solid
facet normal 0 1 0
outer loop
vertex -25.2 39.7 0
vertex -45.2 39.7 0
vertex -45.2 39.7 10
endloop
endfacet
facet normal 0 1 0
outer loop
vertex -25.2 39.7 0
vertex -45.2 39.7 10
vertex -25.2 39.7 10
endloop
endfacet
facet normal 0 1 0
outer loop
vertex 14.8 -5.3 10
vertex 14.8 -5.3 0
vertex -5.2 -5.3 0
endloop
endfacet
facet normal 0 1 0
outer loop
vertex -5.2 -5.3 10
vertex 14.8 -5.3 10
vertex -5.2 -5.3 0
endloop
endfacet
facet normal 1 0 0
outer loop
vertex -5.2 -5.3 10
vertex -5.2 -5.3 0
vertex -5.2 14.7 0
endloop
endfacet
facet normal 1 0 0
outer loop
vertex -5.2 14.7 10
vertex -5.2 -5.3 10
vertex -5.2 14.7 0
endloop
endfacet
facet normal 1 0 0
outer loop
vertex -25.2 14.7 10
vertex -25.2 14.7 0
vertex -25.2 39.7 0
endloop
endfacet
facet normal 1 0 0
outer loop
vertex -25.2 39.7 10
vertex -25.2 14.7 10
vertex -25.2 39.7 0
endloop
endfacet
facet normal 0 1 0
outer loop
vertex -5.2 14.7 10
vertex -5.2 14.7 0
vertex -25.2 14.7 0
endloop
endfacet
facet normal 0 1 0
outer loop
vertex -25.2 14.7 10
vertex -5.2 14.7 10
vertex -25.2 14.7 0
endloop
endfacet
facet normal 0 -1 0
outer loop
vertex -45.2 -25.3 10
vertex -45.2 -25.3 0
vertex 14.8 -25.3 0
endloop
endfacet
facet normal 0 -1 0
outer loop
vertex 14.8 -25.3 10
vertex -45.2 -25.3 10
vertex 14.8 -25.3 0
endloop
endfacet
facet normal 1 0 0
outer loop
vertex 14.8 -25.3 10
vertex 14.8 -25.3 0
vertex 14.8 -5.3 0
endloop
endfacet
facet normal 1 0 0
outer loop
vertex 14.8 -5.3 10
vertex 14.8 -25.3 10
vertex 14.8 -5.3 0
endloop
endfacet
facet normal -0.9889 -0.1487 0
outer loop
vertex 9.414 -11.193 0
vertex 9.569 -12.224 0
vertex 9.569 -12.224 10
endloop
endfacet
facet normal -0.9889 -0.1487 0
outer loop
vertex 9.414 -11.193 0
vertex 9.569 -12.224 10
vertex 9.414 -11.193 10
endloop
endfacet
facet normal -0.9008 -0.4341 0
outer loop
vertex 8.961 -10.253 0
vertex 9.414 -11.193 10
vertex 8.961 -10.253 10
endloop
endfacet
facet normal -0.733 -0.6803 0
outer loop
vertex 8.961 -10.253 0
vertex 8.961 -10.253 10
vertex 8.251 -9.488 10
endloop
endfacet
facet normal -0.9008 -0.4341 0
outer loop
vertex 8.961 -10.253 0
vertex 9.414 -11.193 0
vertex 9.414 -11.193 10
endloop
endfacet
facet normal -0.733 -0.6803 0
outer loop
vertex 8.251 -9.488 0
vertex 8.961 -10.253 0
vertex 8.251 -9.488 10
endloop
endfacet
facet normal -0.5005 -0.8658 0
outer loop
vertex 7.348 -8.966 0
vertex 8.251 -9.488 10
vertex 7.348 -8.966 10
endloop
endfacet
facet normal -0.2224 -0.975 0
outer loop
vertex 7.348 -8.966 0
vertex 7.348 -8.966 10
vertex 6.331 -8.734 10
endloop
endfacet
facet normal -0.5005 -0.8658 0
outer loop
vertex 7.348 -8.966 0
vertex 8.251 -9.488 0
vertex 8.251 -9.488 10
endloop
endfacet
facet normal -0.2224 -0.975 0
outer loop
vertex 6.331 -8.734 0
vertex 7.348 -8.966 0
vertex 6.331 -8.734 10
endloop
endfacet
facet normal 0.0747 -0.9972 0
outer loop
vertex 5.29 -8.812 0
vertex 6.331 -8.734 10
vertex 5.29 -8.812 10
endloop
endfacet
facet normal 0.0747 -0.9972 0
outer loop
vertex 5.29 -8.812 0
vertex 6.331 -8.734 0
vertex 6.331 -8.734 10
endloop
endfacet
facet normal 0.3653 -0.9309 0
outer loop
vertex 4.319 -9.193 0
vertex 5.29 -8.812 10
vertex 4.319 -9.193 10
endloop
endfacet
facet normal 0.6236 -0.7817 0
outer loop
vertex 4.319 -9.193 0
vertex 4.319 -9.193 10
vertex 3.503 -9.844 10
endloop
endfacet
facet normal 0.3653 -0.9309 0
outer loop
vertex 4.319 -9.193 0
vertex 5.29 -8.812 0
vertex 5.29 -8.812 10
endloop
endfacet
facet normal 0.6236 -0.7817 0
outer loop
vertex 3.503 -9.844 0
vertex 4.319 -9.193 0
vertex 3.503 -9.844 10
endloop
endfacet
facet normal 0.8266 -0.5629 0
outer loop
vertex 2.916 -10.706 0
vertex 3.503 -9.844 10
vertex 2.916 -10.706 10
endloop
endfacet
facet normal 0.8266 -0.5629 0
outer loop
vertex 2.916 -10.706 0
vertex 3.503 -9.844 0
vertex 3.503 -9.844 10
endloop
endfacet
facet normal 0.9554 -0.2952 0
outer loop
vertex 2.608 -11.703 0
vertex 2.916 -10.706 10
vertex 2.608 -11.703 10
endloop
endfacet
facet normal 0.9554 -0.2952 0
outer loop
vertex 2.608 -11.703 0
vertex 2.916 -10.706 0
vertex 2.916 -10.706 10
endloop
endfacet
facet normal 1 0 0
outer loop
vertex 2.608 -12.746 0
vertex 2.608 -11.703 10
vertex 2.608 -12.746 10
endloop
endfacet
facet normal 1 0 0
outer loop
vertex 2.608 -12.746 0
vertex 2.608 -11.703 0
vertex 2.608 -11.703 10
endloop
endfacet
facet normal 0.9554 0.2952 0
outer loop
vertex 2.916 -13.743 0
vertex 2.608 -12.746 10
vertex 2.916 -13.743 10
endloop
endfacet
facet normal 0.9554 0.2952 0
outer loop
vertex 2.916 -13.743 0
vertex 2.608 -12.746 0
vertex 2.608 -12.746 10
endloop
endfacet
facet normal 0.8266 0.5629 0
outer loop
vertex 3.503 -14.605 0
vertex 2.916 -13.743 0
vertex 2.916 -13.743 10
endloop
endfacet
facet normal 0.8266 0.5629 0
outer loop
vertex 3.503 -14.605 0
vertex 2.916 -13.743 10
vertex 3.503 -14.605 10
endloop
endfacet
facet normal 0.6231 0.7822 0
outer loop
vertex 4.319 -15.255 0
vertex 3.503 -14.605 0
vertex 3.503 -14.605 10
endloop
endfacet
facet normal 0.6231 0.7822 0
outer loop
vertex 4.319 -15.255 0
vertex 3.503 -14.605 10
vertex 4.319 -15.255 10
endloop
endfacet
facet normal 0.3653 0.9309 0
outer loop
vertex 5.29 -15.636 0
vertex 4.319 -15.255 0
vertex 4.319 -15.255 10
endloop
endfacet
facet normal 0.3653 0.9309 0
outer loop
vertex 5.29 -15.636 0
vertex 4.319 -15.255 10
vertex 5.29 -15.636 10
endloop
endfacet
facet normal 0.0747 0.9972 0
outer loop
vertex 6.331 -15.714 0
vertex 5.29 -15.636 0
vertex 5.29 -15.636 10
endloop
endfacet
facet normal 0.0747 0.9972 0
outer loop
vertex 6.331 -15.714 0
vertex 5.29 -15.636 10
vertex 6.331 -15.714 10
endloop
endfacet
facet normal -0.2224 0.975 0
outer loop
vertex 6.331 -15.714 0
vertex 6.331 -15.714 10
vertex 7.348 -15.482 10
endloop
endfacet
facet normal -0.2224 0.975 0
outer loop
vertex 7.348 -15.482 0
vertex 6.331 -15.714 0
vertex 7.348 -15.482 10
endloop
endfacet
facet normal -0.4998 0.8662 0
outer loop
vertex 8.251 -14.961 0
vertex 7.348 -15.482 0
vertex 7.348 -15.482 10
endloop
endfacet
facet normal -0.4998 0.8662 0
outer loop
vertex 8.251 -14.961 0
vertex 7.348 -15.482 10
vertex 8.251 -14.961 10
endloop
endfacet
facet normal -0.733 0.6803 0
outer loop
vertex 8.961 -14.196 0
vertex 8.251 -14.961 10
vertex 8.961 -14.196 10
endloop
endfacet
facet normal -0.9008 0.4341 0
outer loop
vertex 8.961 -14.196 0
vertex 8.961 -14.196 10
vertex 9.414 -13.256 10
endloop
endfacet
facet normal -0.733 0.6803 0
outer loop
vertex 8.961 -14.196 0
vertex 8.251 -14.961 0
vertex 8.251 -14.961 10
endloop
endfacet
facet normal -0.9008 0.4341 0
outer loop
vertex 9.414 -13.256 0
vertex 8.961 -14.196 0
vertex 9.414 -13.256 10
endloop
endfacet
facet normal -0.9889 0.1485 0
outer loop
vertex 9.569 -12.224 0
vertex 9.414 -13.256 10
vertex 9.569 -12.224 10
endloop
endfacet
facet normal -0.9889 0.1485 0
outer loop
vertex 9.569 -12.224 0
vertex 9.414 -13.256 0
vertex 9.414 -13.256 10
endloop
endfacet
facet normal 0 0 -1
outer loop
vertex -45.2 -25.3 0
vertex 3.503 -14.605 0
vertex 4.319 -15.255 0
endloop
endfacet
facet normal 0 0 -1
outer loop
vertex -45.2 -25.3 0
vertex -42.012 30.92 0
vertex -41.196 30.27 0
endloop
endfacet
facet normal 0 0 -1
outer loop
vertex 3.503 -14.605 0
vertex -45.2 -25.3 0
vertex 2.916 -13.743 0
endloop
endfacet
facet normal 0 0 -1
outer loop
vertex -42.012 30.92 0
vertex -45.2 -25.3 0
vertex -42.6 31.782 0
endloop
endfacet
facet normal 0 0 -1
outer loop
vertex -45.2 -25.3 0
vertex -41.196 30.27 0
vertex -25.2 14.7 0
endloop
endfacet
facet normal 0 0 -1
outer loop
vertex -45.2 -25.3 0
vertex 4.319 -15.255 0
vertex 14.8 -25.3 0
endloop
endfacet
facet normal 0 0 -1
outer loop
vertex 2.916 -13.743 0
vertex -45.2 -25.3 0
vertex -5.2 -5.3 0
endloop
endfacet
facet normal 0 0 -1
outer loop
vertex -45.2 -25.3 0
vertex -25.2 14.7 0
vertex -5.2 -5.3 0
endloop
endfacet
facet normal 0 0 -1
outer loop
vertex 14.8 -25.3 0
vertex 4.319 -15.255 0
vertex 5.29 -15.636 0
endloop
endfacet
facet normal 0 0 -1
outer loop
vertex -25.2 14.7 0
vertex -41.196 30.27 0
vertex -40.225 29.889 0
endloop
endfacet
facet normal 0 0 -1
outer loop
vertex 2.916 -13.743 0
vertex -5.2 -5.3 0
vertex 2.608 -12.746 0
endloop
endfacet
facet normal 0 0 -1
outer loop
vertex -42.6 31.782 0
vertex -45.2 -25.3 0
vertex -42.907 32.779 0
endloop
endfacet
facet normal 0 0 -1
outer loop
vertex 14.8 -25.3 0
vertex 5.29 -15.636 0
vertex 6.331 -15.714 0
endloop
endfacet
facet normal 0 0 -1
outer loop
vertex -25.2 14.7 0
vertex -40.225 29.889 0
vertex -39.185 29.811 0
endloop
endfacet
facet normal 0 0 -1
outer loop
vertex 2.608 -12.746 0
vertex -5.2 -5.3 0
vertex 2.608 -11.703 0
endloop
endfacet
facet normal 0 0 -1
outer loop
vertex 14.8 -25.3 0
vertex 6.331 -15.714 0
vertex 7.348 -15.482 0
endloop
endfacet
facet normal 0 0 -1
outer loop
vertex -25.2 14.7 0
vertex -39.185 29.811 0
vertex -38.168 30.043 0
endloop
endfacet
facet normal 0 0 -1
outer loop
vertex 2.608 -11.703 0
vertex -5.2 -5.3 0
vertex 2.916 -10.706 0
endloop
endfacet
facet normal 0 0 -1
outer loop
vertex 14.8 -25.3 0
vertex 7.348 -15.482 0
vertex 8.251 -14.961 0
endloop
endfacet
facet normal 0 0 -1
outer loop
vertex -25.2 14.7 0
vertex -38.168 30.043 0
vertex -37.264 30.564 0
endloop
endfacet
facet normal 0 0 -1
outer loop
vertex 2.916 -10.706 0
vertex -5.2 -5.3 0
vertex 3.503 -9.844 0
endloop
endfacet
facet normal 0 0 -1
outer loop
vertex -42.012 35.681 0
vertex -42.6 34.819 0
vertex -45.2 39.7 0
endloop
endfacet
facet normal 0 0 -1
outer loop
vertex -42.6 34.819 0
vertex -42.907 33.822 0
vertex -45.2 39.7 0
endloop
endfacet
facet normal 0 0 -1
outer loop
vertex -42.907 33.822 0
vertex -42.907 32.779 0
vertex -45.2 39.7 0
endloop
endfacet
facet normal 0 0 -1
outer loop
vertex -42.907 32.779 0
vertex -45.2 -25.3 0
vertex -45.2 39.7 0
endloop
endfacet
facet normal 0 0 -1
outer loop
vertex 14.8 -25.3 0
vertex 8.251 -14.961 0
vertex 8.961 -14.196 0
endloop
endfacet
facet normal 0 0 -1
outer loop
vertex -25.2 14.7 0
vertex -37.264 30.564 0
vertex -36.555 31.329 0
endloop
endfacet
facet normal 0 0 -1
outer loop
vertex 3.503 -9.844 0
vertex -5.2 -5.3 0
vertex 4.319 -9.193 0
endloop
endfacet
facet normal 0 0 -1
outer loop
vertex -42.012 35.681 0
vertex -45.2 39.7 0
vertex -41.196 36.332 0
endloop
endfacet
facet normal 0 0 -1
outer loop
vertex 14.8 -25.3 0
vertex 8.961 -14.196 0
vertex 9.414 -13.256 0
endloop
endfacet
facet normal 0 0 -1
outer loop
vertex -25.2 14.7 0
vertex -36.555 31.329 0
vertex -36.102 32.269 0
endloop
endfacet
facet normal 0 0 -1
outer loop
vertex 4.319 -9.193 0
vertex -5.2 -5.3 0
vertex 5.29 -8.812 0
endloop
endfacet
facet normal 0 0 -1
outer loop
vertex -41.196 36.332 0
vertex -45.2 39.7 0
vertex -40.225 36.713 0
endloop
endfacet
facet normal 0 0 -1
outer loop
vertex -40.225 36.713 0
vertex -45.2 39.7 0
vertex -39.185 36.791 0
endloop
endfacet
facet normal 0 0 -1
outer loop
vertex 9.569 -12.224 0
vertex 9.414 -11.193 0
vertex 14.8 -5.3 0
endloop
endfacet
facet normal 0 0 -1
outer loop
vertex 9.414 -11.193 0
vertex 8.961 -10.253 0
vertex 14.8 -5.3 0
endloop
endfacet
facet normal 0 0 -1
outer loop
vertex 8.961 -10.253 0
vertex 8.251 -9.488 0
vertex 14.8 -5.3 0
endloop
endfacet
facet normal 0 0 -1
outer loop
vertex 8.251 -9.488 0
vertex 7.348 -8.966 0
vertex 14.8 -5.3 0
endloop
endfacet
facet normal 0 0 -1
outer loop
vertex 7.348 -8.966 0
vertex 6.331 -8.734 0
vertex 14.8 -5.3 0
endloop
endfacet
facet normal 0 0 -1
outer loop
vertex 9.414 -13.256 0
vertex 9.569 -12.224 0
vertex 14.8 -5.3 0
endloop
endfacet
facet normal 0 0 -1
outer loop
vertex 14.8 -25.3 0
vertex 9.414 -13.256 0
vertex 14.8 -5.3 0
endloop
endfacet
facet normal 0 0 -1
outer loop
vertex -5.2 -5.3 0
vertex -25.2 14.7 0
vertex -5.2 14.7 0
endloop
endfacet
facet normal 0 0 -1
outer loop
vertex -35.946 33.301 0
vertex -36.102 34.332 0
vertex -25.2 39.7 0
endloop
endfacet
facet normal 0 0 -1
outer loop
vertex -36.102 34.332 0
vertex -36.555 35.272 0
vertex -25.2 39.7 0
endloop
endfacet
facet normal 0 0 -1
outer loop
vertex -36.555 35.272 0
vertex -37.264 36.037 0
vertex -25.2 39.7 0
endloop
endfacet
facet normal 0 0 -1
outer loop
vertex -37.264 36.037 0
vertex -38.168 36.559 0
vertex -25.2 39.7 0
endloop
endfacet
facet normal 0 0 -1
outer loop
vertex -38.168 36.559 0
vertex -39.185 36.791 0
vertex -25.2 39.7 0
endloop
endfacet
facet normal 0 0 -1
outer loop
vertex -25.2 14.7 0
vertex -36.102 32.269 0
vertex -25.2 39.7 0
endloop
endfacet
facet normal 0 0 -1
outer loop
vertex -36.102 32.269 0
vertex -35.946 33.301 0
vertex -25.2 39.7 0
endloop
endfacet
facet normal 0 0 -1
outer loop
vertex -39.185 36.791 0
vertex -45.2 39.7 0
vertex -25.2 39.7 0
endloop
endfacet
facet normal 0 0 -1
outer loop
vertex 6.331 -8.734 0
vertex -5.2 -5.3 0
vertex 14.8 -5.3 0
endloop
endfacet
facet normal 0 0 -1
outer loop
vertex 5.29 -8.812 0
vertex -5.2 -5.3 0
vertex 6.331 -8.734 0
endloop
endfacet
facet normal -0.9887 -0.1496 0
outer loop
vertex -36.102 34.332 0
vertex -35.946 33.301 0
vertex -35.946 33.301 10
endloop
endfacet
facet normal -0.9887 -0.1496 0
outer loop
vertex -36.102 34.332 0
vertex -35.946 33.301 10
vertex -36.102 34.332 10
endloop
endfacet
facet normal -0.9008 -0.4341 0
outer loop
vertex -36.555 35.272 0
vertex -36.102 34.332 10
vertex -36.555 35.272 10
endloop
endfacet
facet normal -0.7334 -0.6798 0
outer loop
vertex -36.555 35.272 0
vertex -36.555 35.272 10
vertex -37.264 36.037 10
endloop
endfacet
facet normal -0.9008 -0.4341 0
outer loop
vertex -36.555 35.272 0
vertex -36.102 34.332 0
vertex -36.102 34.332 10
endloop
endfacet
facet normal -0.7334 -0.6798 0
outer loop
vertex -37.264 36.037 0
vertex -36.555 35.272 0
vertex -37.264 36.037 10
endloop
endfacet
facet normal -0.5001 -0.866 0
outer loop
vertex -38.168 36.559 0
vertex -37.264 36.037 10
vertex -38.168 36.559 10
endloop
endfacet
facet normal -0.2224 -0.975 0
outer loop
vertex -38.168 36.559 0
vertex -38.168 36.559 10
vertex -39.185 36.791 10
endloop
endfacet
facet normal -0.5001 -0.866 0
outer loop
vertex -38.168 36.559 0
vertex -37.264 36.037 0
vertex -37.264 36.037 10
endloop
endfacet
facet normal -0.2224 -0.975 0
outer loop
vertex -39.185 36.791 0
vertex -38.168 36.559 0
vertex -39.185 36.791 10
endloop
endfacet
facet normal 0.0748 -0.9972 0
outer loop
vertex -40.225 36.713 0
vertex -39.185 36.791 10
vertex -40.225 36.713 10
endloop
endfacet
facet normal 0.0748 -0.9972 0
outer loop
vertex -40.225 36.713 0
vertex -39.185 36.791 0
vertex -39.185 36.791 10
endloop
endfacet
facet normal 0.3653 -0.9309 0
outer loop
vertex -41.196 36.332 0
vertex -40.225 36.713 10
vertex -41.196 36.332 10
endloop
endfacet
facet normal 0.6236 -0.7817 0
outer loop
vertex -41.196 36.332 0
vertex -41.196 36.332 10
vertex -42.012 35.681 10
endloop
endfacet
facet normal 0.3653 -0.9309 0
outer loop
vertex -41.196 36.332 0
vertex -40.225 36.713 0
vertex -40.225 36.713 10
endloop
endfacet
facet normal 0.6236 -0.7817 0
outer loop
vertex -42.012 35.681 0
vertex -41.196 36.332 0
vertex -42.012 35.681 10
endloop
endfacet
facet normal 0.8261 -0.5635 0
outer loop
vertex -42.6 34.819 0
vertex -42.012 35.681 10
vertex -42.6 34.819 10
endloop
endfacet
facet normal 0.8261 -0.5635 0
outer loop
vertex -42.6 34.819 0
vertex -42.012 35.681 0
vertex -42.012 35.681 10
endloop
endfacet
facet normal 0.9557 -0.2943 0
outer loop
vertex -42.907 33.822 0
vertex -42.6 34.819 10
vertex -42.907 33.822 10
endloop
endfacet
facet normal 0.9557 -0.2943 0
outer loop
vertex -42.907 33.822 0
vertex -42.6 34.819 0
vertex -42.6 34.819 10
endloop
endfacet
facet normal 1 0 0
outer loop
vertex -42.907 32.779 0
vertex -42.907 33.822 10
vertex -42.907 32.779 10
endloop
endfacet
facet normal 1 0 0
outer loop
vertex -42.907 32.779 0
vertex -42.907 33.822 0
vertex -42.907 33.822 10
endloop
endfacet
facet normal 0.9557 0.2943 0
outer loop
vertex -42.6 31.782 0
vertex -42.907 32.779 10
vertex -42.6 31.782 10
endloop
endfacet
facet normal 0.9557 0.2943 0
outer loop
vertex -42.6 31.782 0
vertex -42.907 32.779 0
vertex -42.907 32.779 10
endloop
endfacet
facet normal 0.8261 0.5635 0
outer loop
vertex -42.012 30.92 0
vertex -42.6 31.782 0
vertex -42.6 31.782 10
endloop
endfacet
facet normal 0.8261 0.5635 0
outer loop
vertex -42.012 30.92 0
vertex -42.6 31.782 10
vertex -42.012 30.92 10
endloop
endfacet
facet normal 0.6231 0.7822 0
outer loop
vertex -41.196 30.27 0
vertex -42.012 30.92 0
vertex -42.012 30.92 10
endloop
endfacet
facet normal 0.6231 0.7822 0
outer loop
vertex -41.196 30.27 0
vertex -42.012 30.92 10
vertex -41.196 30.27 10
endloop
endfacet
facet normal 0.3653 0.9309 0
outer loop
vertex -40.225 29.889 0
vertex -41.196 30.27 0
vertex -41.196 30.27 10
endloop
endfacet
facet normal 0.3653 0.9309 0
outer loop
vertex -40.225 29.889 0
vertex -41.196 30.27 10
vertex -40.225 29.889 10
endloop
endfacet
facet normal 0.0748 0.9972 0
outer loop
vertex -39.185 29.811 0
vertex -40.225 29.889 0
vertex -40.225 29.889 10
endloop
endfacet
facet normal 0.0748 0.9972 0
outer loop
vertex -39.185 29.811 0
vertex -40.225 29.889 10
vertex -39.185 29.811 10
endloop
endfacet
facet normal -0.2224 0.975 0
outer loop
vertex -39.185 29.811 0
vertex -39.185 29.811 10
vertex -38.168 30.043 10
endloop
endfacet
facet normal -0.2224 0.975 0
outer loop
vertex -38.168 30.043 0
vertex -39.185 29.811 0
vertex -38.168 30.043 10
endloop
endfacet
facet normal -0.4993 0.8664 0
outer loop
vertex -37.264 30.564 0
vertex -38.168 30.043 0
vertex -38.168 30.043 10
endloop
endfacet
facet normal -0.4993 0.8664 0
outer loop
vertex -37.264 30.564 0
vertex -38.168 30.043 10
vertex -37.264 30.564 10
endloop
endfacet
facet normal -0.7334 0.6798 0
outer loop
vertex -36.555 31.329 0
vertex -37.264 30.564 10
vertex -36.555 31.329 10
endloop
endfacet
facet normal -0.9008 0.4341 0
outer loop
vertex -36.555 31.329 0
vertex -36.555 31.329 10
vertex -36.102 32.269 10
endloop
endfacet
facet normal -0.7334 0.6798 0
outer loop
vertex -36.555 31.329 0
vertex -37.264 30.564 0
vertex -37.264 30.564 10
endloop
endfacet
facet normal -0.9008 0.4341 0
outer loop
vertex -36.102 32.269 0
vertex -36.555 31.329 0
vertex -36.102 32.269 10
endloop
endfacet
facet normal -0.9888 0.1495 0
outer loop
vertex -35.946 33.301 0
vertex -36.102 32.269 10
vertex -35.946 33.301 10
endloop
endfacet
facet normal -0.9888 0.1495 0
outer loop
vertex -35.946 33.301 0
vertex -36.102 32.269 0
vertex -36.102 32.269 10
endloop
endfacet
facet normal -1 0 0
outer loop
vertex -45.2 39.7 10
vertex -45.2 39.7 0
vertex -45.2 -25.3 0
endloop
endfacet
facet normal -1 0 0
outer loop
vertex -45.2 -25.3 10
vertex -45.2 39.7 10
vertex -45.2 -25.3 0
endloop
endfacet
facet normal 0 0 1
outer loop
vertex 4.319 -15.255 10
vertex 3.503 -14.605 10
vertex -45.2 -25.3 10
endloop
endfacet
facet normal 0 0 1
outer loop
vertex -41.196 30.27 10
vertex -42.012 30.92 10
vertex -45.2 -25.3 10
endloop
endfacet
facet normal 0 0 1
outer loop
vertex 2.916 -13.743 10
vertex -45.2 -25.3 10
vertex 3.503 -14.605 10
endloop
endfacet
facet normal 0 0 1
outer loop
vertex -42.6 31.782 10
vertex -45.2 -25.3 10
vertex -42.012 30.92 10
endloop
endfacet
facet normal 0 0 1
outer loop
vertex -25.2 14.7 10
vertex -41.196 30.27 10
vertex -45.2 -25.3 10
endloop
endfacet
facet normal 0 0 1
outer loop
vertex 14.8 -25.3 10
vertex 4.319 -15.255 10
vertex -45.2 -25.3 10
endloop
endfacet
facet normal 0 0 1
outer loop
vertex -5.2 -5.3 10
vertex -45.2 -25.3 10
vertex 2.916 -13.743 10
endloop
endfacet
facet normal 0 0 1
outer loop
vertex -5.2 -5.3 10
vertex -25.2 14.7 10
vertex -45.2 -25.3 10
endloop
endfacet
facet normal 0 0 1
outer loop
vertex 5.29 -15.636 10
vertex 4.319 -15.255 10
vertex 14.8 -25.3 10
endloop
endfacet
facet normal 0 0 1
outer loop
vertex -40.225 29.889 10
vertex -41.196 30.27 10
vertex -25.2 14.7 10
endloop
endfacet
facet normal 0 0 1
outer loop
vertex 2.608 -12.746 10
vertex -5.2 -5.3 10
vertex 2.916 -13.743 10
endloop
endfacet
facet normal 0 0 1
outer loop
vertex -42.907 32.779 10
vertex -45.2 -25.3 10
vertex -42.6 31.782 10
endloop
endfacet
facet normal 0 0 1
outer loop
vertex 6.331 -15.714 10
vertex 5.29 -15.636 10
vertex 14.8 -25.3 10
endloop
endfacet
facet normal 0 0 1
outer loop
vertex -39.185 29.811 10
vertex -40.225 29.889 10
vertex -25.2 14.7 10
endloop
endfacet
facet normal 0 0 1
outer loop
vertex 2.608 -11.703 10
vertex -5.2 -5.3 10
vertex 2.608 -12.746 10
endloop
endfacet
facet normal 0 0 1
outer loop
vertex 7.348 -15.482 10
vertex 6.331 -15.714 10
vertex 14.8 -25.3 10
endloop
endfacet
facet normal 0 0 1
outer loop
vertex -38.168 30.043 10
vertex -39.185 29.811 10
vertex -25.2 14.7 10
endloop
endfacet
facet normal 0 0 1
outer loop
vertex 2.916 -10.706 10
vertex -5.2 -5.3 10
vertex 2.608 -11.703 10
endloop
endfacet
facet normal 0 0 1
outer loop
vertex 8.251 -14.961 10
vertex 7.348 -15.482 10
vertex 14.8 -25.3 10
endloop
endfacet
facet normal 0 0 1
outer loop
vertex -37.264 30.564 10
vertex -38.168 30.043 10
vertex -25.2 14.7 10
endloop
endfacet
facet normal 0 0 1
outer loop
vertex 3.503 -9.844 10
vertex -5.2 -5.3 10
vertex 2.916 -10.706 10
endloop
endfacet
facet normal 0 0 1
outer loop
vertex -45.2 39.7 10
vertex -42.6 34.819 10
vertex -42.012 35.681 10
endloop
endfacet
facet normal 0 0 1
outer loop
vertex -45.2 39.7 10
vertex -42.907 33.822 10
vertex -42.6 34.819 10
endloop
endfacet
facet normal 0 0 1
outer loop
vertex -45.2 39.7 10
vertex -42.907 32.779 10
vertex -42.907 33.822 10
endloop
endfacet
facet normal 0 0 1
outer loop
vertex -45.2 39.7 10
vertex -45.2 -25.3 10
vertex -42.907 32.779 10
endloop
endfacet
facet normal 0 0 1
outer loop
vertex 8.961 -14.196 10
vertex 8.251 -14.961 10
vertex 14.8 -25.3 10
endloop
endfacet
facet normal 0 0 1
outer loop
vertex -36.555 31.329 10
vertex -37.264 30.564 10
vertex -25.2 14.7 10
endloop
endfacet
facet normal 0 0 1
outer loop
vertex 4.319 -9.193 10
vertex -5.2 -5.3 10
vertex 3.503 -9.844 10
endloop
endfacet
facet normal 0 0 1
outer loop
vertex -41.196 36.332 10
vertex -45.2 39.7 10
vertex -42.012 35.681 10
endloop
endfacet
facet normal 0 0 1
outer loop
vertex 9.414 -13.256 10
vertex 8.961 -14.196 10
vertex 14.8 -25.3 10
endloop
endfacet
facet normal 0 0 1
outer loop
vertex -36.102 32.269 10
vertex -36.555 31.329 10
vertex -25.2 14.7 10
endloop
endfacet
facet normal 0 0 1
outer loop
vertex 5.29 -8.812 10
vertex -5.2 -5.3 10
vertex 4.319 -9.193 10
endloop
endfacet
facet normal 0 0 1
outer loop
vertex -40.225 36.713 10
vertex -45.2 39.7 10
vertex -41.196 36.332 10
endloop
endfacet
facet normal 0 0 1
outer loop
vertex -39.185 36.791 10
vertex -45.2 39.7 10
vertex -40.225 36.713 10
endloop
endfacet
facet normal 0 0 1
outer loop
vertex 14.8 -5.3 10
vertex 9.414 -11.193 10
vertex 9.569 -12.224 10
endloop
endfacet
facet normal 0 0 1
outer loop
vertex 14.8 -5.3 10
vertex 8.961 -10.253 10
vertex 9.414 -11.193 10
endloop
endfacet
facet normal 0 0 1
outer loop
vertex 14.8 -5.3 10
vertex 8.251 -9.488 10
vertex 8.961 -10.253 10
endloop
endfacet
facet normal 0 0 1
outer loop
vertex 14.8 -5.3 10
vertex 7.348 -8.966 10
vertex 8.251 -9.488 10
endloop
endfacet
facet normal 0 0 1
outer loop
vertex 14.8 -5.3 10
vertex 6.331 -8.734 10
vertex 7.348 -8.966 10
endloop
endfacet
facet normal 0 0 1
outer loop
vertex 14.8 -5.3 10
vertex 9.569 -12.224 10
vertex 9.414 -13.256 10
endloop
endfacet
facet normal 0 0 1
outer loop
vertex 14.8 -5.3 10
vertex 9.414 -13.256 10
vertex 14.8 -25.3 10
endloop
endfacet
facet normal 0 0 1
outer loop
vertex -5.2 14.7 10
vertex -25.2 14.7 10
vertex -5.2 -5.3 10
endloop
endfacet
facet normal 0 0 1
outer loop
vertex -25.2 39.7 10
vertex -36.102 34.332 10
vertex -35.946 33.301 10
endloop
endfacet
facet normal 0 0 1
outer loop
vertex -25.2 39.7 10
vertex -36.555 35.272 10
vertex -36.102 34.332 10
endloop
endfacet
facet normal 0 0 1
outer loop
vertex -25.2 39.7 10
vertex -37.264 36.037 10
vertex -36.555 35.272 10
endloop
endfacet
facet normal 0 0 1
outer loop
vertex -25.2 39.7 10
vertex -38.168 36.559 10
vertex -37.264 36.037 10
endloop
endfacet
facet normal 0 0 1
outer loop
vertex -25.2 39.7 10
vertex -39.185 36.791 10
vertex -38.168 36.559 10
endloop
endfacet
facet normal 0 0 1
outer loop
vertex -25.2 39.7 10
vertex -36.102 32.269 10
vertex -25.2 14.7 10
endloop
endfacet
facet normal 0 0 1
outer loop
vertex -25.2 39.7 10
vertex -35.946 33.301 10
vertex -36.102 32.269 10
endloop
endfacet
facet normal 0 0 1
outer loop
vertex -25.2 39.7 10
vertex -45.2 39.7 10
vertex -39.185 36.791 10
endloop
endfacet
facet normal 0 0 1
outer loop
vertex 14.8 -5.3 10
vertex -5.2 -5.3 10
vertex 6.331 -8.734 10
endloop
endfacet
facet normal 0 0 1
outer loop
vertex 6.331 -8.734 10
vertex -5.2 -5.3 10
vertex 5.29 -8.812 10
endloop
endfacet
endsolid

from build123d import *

# Parameters (mm, degrees)
F0_W     = 20
F0_H     = 25
F0_R     = 3.5
F1_DEPTH = 10


with BuildPart() as f1:
    # F0 (on Top) → F1 (new body)
    with BuildSketch(Plane.XY):
        with Locations((-35.199998, 27.2)):
            Rectangle(F0_W, F0_H)
        with Locations((-39.446462, 33.300817)):
            Circle(F0_R, mode=Mode.SUBTRACT)
        Polygon((-5.199998, -5.3), (-45.199998, -5.3), (-45.199998, -25.3), (14.800002, -25.3), (14.800002, -5.3), align=None)
        with Locations((6.069177, -12.224216)):
            Circle(F0_R, mode=Mode.SUBTRACT)
        Polygon((-25.199998, 14.7), (-45.199998, 14.7), (-45.199998, -5.3), (-5.199998, -5.3), (-5.199998, 14.7), align=None)
    extrude(amount=F1_DEPTH)


solid = f1.part
